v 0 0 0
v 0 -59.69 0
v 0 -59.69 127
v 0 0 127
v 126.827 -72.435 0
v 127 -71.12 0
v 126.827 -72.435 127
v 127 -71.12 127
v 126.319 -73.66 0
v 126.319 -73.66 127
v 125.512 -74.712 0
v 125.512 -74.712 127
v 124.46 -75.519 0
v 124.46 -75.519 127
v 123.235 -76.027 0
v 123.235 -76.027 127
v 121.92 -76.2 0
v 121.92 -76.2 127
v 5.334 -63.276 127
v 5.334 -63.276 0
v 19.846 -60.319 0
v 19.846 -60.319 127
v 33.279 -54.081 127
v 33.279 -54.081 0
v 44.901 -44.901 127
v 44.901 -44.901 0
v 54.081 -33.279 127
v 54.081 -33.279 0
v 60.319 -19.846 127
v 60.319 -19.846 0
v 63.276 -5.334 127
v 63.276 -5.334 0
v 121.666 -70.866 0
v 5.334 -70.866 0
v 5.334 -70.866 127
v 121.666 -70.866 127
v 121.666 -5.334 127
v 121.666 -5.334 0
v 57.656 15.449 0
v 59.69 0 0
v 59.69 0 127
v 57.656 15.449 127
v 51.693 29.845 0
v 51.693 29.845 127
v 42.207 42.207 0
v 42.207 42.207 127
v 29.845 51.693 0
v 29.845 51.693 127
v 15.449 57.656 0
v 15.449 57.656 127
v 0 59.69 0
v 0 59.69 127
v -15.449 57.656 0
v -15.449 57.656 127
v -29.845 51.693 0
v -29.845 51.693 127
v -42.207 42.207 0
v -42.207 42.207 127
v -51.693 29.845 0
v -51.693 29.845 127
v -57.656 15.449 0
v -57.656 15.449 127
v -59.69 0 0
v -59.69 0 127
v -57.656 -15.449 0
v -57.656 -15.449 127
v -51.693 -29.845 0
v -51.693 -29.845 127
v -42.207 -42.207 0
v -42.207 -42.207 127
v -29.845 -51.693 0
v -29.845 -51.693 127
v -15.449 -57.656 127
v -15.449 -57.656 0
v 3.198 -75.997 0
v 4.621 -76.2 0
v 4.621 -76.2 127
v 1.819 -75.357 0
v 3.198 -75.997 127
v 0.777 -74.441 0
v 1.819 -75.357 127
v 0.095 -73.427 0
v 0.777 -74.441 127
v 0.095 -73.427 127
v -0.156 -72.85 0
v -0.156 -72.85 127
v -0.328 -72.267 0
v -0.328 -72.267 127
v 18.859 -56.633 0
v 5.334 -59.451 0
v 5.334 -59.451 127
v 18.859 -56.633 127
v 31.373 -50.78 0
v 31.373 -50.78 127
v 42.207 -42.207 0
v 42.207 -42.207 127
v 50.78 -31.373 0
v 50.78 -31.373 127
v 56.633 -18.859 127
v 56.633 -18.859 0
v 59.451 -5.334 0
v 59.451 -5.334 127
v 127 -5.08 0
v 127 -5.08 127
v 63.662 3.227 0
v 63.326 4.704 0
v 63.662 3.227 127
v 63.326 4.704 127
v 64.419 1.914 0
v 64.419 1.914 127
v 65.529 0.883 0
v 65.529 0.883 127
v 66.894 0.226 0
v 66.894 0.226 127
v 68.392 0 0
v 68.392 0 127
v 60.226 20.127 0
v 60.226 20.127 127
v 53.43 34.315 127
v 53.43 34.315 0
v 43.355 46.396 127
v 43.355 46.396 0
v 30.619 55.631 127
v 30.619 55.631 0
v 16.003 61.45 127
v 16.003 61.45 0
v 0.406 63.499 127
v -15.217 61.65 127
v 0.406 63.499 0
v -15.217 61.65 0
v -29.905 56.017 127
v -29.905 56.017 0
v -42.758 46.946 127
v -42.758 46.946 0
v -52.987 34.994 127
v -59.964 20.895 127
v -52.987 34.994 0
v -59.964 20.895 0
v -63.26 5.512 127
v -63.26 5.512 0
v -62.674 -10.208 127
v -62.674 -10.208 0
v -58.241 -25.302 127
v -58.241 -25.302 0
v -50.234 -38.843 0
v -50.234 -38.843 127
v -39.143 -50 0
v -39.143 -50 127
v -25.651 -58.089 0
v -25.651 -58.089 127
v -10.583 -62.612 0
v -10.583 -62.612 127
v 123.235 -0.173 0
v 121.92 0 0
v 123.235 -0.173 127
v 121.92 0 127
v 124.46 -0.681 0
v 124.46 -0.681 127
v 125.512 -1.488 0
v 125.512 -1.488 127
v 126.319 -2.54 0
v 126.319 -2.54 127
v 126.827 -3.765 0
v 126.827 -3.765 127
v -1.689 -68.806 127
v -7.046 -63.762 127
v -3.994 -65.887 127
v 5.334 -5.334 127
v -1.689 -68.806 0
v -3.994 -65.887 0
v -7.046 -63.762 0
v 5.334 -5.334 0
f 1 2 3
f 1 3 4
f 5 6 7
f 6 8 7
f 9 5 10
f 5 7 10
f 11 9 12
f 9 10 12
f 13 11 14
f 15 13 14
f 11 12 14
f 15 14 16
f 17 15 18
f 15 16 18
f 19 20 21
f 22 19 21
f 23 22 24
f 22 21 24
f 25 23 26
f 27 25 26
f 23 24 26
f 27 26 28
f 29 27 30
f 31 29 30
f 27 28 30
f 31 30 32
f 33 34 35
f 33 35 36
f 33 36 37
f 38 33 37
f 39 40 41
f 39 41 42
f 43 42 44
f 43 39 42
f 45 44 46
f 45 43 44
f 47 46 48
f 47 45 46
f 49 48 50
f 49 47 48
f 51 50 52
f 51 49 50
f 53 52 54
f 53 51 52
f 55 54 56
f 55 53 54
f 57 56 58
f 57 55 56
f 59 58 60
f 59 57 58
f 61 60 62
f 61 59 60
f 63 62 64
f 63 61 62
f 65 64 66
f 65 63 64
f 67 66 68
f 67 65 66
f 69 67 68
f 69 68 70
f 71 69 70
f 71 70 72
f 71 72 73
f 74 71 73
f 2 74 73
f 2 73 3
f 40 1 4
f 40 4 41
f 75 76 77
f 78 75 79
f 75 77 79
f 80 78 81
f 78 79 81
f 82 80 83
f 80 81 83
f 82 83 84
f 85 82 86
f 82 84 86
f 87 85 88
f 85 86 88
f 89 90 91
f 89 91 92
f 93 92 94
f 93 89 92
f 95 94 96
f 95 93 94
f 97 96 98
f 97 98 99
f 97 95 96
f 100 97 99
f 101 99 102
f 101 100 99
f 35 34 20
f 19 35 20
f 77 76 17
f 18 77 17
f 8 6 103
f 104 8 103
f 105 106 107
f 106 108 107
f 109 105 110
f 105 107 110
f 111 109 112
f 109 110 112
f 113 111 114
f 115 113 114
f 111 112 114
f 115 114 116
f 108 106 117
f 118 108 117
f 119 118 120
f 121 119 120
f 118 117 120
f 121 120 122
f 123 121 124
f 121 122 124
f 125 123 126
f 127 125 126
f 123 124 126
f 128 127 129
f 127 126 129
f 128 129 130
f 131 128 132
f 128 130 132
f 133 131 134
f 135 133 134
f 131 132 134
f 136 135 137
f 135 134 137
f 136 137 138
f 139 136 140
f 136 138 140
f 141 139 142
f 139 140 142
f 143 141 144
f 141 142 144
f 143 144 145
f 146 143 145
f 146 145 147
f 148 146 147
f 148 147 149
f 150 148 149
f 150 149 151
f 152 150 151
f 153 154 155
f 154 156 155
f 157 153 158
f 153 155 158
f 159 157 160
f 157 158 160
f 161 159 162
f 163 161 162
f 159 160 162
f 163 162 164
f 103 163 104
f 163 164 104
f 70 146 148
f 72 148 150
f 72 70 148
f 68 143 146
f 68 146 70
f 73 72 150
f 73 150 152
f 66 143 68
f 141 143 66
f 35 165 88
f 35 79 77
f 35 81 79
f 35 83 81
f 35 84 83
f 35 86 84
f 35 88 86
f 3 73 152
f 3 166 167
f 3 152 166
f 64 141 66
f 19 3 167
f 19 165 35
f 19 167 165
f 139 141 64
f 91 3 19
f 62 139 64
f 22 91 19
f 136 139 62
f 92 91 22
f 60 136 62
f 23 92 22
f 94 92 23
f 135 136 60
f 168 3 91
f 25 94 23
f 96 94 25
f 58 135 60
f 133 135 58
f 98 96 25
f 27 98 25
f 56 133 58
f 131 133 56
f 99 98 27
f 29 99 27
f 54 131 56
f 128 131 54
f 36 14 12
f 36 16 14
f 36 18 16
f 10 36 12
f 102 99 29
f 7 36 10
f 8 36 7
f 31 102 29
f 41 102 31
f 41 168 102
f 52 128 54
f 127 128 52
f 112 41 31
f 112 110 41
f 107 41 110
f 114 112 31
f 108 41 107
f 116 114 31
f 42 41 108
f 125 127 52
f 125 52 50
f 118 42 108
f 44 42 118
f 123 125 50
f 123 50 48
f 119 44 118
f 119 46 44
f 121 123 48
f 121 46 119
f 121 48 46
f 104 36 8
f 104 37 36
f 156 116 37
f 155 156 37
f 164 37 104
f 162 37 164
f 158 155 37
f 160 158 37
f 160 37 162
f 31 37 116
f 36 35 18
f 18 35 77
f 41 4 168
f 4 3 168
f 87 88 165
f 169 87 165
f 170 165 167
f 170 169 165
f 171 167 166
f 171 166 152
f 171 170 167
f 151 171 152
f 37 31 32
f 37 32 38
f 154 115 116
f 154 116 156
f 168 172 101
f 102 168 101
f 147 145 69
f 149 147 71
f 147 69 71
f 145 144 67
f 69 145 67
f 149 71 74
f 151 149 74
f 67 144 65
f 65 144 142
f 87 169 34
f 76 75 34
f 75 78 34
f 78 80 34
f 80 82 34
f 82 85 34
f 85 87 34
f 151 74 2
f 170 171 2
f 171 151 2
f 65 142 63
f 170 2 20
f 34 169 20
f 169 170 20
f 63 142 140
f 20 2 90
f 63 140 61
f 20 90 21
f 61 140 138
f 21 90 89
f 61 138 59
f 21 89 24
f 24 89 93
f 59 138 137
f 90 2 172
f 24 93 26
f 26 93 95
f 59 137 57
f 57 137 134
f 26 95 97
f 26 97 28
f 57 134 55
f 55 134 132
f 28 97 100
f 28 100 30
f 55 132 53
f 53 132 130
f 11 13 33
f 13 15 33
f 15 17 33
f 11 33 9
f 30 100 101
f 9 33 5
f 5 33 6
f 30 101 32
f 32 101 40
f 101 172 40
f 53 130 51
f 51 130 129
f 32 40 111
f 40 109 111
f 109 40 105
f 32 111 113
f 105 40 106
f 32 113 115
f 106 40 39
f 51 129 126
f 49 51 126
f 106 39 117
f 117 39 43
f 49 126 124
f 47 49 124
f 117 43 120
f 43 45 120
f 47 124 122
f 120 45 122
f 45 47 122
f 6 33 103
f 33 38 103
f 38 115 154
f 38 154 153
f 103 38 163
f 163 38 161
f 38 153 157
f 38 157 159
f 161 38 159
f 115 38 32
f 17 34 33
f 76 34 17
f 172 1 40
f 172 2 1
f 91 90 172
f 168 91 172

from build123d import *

# Parameters (mm, degrees)
F0_R     = 63.5
F0_R_2   = 59.69
F1_DEPTH = 127
F2_W     = 127
F2_H     = 76.2
F2_W_2   = 116.3319997936
F2_H_2   = 65.5319997936
F3_DEPTH = 127
F4_R     = 12.7
F5_R     = 5.08
F6_R     = 5.08
F7_R     = 5.08
F8_R     = 5.08


with BuildPart() as f1:
    # F0 (on Top) → F1 (new body)
    with BuildSketch(Plane.XY):
        Circle(F0_R)
        Circle(F0_R_2, mode=Mode.SUBTRACT)
    extrude(amount=F1_DEPTH)

    # F2 (on Top) → F3 (join)
    with BuildSketch(Plane.XY):
        with Locations((63.5, -38.1)):
            Rectangle(F2_W, F2_H)
        with Locations((63.5, -38.1)):
            Rectangle(F2_W_2, F2_H_2, mode=Mode.SUBTRACT)
    extrude(amount=F3_DEPTH)

    # F4
    f4_edges = [f1.edges().sort_by_distance(p)[0] for p in [
        (0, -63.5, 63.5),
    ]]
    fillet(f4_edges, radius=F4_R)

    # F5
    f5_edges = [f1.edges().sort_by_distance(p)[0] for p in [
        (63.5, 0, 63.5),
    ]]
    fillet(f5_edges, radius=F5_R)

    # F6
    f6_edges = [f1.edges().sort_by_distance(p)[0] for p in [
        (127, 0, 63.5),
    ]]
    fillet(f6_edges, radius=F6_R)

    # F7
    f7_edges = [f1.edges().sort_by_distance(p)[0] for p in [
        (127, -76.2, 63.5),
    ]]
    fillet(f7_edges, radius=F7_R)

    # F8
    f8_edges = [f1.edges().sort_by_distance(p)[0] for p in [
        (0, -76.2, 63.5),
    ]]
    fillet(f8_edges, radius=F8_R)


solid = f1.part
